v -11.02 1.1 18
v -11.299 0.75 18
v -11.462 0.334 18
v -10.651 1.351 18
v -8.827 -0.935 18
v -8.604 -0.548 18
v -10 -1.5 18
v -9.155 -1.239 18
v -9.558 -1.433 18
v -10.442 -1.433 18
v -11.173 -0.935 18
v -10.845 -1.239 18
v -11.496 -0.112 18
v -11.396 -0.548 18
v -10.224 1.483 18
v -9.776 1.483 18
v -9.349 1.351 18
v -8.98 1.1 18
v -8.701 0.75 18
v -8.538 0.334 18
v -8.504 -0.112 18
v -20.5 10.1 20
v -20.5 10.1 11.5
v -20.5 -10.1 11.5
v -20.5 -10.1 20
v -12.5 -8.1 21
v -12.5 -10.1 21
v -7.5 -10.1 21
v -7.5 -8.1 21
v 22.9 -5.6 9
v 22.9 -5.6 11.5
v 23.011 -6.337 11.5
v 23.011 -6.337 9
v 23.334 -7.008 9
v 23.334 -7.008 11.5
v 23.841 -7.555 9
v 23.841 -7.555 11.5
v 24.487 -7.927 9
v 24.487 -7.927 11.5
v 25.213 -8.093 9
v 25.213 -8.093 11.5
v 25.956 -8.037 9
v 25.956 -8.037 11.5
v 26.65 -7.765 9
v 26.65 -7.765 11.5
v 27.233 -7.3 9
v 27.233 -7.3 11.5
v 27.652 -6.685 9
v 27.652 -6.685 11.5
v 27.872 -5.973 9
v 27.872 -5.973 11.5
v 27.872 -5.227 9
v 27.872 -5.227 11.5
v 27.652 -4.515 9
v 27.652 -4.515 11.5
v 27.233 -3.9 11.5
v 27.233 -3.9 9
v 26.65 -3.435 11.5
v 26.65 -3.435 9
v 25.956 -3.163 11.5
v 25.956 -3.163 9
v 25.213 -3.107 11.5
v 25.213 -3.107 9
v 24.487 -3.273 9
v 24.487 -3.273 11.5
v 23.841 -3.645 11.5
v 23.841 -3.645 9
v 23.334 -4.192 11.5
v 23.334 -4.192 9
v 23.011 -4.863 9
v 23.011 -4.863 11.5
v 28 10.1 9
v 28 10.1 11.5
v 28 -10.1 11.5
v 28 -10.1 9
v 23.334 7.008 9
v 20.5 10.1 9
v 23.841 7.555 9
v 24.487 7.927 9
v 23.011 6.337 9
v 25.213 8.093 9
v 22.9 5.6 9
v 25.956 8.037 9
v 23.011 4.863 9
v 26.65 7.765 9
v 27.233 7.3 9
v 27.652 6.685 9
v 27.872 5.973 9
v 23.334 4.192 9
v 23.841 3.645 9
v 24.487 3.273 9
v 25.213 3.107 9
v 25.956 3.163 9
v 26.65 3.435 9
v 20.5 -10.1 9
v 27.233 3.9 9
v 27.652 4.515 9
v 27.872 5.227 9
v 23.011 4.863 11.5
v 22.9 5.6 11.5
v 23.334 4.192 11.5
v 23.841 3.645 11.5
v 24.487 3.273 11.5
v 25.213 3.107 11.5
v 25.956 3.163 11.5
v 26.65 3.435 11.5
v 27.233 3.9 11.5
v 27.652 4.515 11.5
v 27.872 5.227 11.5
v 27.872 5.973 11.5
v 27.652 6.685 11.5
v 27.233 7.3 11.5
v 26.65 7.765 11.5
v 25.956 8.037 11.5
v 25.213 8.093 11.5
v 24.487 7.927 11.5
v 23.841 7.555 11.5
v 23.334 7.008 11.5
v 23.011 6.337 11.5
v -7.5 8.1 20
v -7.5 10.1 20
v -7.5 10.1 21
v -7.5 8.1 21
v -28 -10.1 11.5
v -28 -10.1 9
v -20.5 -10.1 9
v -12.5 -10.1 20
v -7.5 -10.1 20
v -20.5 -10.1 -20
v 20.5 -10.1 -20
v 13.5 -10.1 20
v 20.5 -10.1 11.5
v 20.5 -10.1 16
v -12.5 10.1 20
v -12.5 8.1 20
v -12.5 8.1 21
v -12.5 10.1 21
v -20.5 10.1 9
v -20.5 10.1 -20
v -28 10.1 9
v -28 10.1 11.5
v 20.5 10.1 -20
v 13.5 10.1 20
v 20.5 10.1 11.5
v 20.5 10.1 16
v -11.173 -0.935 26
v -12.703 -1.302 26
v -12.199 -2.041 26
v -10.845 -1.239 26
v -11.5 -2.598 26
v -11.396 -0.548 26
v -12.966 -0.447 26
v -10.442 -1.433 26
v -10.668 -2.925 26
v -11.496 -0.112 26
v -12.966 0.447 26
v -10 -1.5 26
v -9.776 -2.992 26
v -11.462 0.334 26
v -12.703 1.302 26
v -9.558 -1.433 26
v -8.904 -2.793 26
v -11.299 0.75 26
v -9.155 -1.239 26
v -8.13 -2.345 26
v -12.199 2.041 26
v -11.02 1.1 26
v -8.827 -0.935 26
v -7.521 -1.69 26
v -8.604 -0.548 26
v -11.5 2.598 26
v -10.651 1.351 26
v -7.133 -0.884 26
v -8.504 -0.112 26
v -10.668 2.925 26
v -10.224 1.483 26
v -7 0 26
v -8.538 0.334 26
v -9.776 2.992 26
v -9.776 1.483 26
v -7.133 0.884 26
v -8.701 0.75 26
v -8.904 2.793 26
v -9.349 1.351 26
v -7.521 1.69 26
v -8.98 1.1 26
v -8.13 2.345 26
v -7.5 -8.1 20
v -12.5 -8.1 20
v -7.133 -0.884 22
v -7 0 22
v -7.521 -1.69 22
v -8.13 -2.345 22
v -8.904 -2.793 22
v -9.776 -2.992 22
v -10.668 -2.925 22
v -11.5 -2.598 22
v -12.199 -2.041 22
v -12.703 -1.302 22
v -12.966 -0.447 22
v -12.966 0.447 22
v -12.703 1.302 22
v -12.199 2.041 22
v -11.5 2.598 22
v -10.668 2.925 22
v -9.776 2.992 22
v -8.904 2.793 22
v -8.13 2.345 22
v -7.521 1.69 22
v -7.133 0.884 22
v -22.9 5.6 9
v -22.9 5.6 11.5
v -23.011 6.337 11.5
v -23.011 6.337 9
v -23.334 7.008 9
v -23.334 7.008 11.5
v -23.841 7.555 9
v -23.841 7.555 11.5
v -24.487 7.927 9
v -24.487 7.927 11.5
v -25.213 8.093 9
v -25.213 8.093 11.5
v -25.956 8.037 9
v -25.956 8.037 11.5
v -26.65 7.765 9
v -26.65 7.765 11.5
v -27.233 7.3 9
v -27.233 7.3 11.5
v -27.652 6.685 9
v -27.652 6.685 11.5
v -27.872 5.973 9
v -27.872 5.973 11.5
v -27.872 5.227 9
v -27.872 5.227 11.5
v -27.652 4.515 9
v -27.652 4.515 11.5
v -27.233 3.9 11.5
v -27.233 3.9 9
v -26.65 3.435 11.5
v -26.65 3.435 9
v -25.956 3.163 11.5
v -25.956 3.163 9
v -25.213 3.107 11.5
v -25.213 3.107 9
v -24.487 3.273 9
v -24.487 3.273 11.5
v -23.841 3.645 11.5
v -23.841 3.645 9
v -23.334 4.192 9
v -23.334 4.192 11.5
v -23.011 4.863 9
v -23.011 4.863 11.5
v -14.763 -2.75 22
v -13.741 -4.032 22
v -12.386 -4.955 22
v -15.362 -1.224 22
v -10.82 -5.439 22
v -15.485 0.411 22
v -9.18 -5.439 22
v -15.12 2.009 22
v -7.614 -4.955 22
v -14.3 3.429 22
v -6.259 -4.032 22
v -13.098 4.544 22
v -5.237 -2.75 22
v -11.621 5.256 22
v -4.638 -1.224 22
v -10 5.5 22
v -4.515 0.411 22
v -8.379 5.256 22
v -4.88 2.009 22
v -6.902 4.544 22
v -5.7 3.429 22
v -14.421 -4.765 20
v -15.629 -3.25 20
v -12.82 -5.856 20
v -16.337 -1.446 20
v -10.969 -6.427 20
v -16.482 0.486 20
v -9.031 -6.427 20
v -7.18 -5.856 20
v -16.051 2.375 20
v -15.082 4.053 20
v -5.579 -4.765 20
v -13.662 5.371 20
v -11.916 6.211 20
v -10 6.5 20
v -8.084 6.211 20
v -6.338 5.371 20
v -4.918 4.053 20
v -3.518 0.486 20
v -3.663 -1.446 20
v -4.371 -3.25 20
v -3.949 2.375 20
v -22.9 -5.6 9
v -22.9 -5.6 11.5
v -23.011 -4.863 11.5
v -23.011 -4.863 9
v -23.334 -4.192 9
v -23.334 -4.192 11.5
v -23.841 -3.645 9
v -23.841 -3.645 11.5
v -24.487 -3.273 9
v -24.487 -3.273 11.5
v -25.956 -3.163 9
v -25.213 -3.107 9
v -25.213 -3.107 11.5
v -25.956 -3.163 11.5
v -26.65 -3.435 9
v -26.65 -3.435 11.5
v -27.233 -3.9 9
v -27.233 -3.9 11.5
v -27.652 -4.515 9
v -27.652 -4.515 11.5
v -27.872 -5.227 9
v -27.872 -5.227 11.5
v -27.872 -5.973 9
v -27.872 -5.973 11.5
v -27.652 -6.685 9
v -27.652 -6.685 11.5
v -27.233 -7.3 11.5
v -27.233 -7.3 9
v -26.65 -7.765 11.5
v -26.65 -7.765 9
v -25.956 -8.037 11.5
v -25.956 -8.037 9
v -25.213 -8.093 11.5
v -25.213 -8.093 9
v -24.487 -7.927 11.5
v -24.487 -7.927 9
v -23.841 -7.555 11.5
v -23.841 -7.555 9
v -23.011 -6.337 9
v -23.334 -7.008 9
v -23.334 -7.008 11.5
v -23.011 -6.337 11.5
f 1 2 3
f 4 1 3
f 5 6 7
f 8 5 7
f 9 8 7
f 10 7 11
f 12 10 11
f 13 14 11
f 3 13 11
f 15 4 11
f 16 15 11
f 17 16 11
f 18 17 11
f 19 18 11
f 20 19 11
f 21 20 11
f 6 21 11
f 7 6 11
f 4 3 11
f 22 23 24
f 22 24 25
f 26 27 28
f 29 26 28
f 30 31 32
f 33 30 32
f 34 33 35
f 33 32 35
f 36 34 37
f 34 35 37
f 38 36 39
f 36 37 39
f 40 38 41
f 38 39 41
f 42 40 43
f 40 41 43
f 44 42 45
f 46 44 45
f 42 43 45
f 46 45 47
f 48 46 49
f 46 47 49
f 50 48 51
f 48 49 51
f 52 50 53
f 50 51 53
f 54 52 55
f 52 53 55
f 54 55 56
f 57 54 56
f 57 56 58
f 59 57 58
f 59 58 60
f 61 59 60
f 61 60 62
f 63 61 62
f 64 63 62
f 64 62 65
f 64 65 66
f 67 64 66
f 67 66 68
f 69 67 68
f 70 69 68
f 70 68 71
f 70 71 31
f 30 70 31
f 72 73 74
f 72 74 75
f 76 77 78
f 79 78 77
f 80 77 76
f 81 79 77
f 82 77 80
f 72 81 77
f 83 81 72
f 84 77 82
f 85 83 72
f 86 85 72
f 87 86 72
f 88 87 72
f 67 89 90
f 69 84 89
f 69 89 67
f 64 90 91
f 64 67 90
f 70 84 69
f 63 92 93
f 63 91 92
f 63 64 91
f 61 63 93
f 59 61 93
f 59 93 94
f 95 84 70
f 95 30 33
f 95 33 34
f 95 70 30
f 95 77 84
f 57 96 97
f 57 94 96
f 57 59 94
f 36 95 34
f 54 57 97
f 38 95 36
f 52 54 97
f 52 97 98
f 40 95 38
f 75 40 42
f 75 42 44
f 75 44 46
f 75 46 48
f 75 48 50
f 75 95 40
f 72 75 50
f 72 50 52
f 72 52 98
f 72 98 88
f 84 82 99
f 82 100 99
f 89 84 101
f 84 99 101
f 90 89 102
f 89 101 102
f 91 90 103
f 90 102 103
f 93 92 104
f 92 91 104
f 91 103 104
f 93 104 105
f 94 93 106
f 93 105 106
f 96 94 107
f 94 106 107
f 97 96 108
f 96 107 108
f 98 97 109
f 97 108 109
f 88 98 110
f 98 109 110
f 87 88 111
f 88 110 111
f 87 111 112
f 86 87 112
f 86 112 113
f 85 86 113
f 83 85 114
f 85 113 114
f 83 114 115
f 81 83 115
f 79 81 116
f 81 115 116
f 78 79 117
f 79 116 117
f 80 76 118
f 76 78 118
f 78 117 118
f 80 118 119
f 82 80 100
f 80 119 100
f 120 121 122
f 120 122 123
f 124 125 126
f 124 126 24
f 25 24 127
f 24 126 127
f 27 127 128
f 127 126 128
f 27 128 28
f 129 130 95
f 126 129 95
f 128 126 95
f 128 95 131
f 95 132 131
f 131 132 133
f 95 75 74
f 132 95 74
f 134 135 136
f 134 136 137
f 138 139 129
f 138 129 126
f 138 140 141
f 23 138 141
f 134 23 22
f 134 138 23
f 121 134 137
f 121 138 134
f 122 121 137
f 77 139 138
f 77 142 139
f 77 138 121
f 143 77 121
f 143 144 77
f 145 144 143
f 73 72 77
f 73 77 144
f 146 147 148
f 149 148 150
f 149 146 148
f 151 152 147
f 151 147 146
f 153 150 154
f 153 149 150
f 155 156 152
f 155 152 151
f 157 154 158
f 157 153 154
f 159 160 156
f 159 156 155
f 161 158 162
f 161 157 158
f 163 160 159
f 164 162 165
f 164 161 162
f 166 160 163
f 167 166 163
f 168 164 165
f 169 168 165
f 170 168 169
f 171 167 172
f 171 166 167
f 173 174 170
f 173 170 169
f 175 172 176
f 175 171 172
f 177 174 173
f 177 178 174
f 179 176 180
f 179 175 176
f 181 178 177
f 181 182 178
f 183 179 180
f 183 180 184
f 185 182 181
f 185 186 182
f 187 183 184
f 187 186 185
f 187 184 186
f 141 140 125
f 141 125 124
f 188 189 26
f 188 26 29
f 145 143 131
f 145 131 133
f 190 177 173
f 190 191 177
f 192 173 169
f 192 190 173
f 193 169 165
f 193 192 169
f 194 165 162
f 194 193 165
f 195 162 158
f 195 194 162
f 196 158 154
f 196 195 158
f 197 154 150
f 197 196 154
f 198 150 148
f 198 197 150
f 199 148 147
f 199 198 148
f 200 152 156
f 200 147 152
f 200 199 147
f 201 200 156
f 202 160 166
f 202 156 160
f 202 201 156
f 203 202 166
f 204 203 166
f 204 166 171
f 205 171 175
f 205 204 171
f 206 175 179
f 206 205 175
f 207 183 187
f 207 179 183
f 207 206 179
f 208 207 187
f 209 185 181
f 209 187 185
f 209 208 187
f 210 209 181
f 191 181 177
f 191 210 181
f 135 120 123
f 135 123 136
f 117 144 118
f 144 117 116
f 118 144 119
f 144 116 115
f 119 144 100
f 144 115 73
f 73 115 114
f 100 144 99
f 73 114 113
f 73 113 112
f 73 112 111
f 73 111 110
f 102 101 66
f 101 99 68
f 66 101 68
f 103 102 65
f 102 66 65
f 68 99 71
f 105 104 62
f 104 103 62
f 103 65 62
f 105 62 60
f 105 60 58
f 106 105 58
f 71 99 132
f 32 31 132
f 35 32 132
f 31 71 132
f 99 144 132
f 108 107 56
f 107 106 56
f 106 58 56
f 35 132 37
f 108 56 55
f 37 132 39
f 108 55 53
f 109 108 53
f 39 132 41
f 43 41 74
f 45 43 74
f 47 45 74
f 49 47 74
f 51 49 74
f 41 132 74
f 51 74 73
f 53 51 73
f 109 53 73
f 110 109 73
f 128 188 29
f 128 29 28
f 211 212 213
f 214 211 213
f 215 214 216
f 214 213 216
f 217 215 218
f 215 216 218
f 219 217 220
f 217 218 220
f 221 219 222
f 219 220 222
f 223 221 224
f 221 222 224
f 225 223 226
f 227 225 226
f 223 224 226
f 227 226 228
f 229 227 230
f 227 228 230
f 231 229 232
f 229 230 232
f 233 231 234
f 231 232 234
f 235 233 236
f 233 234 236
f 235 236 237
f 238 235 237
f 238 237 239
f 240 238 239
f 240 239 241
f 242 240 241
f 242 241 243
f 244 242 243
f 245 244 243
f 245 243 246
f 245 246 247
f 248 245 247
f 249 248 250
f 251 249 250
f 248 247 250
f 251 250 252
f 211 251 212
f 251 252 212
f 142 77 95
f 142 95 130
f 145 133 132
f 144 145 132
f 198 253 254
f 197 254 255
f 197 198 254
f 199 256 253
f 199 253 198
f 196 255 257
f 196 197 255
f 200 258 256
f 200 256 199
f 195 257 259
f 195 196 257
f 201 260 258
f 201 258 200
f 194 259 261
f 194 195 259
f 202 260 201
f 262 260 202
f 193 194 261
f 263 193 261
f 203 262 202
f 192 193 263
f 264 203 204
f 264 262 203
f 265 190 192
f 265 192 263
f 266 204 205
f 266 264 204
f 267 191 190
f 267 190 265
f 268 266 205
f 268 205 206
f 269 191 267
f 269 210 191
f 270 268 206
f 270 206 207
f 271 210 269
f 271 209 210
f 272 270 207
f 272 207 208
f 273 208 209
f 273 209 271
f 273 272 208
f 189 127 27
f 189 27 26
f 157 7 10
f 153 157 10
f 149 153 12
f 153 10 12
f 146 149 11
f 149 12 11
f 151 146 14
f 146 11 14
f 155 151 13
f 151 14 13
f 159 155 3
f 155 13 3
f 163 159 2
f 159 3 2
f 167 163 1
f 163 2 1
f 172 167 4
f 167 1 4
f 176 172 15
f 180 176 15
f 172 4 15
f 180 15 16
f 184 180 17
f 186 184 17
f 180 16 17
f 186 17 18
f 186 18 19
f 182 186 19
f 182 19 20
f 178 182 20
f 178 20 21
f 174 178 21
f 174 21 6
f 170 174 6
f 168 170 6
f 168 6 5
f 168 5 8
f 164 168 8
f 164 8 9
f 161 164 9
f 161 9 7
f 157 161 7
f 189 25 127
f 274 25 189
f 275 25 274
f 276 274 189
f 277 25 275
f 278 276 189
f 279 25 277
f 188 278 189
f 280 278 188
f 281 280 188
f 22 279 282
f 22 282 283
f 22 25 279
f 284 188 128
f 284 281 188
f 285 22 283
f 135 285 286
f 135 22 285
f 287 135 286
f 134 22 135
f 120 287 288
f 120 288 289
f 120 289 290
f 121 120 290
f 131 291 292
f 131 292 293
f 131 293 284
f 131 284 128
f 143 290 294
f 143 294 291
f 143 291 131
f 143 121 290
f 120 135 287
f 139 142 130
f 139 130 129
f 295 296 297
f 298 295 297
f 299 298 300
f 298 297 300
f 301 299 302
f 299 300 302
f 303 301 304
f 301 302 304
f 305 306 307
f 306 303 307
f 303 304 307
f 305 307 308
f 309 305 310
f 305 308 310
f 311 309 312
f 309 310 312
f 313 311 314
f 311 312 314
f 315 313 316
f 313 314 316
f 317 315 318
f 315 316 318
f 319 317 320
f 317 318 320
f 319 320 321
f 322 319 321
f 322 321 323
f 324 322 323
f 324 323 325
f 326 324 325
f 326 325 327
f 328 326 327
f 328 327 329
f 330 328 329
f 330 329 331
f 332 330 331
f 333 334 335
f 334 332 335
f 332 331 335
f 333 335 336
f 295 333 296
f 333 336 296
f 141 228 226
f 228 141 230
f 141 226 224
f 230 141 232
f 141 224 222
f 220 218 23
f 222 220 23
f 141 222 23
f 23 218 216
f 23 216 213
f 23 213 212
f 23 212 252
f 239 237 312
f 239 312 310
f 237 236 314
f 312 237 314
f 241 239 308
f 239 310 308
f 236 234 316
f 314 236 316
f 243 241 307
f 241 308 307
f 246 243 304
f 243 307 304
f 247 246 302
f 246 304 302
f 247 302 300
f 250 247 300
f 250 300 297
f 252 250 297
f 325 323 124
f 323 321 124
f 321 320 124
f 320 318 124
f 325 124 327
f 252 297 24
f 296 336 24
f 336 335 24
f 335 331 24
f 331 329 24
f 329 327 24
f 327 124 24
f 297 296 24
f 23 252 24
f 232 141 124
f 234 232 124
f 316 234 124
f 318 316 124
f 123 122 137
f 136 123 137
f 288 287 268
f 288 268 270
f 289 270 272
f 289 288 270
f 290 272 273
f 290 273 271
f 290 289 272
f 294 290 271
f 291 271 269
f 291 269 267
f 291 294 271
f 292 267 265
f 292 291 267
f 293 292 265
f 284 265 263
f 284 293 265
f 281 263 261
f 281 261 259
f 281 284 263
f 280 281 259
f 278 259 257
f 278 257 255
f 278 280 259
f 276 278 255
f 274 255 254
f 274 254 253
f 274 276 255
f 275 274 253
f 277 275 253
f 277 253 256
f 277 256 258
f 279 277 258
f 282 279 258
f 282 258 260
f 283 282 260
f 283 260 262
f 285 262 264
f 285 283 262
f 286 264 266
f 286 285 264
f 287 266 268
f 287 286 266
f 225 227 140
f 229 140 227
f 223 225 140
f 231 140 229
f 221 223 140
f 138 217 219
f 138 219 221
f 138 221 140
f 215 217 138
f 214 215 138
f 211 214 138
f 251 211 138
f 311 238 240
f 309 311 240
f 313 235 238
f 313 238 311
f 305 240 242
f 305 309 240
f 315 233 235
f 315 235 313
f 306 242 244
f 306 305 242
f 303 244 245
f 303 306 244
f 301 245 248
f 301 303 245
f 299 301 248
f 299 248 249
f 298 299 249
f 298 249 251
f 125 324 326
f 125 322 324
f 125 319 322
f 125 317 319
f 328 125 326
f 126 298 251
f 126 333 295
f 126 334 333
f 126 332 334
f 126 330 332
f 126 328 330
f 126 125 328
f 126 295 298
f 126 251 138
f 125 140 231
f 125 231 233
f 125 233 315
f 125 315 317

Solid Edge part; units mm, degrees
sketch "Sketch1" plane through (0, 0, 0) normal (0, -1, 0) x (1, 0, 0)
  line L0 (-20.5, 20) -> (13.5, 20)
  line L1 (13.5, 20) -> (20.5, 16)
  line L2 (20.5, 16) -> (20.5, -20)
  line L3 (20.5, -20) -> (-20.5, -20)
  line L4 (-20.5, -20) -> (-20.5, 20)
extrude "Protrusion1" add sketch "Sketch1" along normal mid plane 20.2
sketch "Sketch2" plane through (3.5, -10.1, 0) normal (0, -1, 0) x (1, 0, 0)
  line L0 (17, 11.5) -> (24.5, 11.5)
  line L1 (24.5, 11.5) -> (24.5, 9)
  line L2 (17, 9) -> (24.5, 9)
  line L3 (17, 11.5) -> (17, 9)
extrude "Protrusion2" add sketch "Sketch2" against normal up to vertex (20.2 mm away)
mirror "Mirror1" about plane through (0, 0, 0) normal (1, 0, 0) of "Protrusion2"
sketch "Sketch3" plane through (-3.5, 0, 20) normal (0, 0, 1) x (0, 1, 0)
  circle A0 centre (0, 6.5) radius 6.5
  dimension "D1" = 17
  dimension "D2" = 13
sketch "Sketch4" plane through (-3.5, 0, 22) normal (0, 0, 1) x (1, 0, 0)
  circle A0 centre (-6.5, 0) radius 5.5
loft "LoftedProtrusion1" add profiles "Sketch3", "Sketch4"
sketch "Sketch5" plane through (-13.5, 0, 22) normal (0, 0, 1) x (1, 0, 0)
  circle A0 centre (3.5, 0) radius 3
extrude "ProtrusiónExtruida_4" add sketch "Sketch5" along normal blind 4
sketch "Sketch6" plane through (-27.75, 0, 11.5) normal (0, 0, 1) x (1, 0, 0)
  circle A0 centre (2.35, 5.6) radius 2.5
extrude "Cutout1" cut sketch "Sketch6" against normal up to vertex (2.5 mm away)
mirror "Mirror2" about plane through (0, 0, 0) normal (0, -1, 0) of "Cutout1"
mirror "Mirror3" about plane through (0, 0, 0) normal (1, 0, 0) of "Cutout1", "Mirror2"
sketch "Sketch7" plane through (-3.5, 0, 20) normal (0, 0, 1) x (0, 1, 0)
  line L0 (10.1, 4) -> (8.1, 4)
  line L1 (8.1, 4) -> (8.1, 9)
  line L2 (8.1, 9) -> (10.1, 9)
  line L3 (10.1, 9) -> (10.1, 4)
extrude "ProtrusiónExtruida_5" add sketch "Sketch7" along normal blind 1
mirror "Mirror4" about plane through (0, 0, 0) normal (0, -1, 0) of "ProtrusiónExtruida_5"
hole "Agujero_2" at (-10, 0, 26) direction (0, 0, -1) diameter 3 depth 8
